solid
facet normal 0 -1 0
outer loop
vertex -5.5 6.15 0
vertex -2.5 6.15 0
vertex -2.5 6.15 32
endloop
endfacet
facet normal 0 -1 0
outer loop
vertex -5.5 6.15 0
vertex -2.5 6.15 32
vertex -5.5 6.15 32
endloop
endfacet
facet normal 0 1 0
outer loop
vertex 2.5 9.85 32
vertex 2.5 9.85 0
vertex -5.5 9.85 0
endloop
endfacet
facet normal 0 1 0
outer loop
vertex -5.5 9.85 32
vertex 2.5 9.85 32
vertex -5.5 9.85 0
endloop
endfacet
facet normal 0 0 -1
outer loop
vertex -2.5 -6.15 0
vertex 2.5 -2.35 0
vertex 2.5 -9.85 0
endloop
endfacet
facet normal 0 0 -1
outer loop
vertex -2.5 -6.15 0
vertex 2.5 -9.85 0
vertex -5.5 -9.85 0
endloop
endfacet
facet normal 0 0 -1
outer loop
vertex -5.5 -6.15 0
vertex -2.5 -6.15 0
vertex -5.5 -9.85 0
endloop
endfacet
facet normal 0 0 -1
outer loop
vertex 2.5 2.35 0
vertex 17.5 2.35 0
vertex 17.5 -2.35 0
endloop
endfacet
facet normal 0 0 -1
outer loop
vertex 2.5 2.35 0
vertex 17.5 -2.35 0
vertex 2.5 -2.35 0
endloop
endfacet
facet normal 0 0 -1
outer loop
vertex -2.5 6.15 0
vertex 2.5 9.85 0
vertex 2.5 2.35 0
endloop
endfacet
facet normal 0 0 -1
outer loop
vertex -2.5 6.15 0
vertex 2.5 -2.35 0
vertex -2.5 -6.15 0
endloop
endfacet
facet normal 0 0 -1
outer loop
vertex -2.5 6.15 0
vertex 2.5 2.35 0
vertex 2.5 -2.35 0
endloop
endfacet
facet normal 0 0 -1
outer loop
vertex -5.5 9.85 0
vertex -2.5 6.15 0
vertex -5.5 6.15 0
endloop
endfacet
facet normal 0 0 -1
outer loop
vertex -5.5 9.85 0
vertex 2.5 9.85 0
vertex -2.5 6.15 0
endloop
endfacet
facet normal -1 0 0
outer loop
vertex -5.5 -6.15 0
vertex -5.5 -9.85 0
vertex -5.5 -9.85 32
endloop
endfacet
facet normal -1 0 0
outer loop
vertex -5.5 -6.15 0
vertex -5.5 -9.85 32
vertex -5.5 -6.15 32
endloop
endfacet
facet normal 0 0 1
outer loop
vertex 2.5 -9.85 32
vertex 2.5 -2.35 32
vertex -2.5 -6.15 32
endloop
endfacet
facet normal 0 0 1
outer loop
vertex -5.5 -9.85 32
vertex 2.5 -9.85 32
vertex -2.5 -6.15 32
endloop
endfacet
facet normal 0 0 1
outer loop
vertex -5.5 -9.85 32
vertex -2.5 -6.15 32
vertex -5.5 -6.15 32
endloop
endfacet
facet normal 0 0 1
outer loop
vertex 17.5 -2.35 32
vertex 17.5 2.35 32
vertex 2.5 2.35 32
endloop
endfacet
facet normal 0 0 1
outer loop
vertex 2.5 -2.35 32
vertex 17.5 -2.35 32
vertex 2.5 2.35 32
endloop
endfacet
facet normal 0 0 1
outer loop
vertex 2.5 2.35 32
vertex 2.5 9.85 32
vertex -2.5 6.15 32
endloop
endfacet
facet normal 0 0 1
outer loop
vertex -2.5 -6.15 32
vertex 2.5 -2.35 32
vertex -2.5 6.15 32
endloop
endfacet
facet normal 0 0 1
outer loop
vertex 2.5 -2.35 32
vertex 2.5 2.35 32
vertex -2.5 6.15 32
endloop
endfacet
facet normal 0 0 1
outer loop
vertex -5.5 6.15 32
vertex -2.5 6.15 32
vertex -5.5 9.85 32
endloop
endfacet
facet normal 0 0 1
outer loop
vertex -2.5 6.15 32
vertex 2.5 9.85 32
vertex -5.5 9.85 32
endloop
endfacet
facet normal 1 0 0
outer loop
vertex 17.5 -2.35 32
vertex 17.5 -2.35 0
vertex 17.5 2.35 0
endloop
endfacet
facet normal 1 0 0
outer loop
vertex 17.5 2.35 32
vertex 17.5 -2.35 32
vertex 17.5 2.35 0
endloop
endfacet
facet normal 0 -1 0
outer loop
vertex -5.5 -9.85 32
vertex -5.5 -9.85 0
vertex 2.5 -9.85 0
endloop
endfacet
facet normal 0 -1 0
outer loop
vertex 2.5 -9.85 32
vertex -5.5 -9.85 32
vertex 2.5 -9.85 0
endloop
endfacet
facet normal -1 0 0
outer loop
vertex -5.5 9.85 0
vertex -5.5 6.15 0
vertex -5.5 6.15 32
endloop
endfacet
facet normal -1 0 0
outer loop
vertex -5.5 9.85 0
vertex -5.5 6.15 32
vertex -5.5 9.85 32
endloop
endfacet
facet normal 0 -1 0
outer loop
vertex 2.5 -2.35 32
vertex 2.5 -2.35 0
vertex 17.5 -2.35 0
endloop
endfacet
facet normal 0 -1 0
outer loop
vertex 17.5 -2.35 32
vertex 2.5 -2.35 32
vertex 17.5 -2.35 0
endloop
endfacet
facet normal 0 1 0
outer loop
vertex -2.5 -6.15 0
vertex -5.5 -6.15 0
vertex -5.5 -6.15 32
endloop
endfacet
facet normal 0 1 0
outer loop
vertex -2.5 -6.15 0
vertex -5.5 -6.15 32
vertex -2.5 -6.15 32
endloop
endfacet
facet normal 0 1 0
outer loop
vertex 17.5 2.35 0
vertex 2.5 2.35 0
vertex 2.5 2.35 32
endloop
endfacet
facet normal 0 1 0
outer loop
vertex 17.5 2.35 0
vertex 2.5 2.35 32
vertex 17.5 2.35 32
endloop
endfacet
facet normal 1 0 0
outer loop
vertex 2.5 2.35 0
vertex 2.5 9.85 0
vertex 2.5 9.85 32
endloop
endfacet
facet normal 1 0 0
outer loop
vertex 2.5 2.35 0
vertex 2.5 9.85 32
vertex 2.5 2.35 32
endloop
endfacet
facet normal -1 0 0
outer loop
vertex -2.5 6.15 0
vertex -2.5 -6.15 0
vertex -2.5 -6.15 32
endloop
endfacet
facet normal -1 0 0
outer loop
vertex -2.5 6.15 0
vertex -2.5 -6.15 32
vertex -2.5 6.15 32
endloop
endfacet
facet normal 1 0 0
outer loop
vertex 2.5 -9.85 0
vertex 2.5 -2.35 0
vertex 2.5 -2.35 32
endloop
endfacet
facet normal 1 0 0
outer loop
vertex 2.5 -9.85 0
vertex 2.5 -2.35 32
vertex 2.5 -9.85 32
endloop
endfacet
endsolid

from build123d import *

# Parameters (mm, degrees)
PAD003_DEPTH = 32
SKETCH_W     = 15
SKETCH_H     = 4.7
PAD_DEPTH    = 32


with BuildPart() as part:
    # Sketch005 → Pad003 (new body)
    with BuildSketch(Plane.XY):
        Polygon((-2.5, 9.85), (2.5, 9.85), (2.5, -9.85), (-2.5, -9.85), (-5.5, -9.85), (-5.5, -6.15), (-2.5, -6.15), (-2.5, 6.15), (-5.5, 6.15), (-5.5, 9.85), align=None)
    extrude(amount=PAD003_DEPTH)

    # Sketch → Pad (join)
    with BuildSketch(Plane.XY):
        with Locations((10, 0)):
            Rectangle(SKETCH_W, SKETCH_H)
    extrude(amount=PAD_DEPTH)


solid = part.part
